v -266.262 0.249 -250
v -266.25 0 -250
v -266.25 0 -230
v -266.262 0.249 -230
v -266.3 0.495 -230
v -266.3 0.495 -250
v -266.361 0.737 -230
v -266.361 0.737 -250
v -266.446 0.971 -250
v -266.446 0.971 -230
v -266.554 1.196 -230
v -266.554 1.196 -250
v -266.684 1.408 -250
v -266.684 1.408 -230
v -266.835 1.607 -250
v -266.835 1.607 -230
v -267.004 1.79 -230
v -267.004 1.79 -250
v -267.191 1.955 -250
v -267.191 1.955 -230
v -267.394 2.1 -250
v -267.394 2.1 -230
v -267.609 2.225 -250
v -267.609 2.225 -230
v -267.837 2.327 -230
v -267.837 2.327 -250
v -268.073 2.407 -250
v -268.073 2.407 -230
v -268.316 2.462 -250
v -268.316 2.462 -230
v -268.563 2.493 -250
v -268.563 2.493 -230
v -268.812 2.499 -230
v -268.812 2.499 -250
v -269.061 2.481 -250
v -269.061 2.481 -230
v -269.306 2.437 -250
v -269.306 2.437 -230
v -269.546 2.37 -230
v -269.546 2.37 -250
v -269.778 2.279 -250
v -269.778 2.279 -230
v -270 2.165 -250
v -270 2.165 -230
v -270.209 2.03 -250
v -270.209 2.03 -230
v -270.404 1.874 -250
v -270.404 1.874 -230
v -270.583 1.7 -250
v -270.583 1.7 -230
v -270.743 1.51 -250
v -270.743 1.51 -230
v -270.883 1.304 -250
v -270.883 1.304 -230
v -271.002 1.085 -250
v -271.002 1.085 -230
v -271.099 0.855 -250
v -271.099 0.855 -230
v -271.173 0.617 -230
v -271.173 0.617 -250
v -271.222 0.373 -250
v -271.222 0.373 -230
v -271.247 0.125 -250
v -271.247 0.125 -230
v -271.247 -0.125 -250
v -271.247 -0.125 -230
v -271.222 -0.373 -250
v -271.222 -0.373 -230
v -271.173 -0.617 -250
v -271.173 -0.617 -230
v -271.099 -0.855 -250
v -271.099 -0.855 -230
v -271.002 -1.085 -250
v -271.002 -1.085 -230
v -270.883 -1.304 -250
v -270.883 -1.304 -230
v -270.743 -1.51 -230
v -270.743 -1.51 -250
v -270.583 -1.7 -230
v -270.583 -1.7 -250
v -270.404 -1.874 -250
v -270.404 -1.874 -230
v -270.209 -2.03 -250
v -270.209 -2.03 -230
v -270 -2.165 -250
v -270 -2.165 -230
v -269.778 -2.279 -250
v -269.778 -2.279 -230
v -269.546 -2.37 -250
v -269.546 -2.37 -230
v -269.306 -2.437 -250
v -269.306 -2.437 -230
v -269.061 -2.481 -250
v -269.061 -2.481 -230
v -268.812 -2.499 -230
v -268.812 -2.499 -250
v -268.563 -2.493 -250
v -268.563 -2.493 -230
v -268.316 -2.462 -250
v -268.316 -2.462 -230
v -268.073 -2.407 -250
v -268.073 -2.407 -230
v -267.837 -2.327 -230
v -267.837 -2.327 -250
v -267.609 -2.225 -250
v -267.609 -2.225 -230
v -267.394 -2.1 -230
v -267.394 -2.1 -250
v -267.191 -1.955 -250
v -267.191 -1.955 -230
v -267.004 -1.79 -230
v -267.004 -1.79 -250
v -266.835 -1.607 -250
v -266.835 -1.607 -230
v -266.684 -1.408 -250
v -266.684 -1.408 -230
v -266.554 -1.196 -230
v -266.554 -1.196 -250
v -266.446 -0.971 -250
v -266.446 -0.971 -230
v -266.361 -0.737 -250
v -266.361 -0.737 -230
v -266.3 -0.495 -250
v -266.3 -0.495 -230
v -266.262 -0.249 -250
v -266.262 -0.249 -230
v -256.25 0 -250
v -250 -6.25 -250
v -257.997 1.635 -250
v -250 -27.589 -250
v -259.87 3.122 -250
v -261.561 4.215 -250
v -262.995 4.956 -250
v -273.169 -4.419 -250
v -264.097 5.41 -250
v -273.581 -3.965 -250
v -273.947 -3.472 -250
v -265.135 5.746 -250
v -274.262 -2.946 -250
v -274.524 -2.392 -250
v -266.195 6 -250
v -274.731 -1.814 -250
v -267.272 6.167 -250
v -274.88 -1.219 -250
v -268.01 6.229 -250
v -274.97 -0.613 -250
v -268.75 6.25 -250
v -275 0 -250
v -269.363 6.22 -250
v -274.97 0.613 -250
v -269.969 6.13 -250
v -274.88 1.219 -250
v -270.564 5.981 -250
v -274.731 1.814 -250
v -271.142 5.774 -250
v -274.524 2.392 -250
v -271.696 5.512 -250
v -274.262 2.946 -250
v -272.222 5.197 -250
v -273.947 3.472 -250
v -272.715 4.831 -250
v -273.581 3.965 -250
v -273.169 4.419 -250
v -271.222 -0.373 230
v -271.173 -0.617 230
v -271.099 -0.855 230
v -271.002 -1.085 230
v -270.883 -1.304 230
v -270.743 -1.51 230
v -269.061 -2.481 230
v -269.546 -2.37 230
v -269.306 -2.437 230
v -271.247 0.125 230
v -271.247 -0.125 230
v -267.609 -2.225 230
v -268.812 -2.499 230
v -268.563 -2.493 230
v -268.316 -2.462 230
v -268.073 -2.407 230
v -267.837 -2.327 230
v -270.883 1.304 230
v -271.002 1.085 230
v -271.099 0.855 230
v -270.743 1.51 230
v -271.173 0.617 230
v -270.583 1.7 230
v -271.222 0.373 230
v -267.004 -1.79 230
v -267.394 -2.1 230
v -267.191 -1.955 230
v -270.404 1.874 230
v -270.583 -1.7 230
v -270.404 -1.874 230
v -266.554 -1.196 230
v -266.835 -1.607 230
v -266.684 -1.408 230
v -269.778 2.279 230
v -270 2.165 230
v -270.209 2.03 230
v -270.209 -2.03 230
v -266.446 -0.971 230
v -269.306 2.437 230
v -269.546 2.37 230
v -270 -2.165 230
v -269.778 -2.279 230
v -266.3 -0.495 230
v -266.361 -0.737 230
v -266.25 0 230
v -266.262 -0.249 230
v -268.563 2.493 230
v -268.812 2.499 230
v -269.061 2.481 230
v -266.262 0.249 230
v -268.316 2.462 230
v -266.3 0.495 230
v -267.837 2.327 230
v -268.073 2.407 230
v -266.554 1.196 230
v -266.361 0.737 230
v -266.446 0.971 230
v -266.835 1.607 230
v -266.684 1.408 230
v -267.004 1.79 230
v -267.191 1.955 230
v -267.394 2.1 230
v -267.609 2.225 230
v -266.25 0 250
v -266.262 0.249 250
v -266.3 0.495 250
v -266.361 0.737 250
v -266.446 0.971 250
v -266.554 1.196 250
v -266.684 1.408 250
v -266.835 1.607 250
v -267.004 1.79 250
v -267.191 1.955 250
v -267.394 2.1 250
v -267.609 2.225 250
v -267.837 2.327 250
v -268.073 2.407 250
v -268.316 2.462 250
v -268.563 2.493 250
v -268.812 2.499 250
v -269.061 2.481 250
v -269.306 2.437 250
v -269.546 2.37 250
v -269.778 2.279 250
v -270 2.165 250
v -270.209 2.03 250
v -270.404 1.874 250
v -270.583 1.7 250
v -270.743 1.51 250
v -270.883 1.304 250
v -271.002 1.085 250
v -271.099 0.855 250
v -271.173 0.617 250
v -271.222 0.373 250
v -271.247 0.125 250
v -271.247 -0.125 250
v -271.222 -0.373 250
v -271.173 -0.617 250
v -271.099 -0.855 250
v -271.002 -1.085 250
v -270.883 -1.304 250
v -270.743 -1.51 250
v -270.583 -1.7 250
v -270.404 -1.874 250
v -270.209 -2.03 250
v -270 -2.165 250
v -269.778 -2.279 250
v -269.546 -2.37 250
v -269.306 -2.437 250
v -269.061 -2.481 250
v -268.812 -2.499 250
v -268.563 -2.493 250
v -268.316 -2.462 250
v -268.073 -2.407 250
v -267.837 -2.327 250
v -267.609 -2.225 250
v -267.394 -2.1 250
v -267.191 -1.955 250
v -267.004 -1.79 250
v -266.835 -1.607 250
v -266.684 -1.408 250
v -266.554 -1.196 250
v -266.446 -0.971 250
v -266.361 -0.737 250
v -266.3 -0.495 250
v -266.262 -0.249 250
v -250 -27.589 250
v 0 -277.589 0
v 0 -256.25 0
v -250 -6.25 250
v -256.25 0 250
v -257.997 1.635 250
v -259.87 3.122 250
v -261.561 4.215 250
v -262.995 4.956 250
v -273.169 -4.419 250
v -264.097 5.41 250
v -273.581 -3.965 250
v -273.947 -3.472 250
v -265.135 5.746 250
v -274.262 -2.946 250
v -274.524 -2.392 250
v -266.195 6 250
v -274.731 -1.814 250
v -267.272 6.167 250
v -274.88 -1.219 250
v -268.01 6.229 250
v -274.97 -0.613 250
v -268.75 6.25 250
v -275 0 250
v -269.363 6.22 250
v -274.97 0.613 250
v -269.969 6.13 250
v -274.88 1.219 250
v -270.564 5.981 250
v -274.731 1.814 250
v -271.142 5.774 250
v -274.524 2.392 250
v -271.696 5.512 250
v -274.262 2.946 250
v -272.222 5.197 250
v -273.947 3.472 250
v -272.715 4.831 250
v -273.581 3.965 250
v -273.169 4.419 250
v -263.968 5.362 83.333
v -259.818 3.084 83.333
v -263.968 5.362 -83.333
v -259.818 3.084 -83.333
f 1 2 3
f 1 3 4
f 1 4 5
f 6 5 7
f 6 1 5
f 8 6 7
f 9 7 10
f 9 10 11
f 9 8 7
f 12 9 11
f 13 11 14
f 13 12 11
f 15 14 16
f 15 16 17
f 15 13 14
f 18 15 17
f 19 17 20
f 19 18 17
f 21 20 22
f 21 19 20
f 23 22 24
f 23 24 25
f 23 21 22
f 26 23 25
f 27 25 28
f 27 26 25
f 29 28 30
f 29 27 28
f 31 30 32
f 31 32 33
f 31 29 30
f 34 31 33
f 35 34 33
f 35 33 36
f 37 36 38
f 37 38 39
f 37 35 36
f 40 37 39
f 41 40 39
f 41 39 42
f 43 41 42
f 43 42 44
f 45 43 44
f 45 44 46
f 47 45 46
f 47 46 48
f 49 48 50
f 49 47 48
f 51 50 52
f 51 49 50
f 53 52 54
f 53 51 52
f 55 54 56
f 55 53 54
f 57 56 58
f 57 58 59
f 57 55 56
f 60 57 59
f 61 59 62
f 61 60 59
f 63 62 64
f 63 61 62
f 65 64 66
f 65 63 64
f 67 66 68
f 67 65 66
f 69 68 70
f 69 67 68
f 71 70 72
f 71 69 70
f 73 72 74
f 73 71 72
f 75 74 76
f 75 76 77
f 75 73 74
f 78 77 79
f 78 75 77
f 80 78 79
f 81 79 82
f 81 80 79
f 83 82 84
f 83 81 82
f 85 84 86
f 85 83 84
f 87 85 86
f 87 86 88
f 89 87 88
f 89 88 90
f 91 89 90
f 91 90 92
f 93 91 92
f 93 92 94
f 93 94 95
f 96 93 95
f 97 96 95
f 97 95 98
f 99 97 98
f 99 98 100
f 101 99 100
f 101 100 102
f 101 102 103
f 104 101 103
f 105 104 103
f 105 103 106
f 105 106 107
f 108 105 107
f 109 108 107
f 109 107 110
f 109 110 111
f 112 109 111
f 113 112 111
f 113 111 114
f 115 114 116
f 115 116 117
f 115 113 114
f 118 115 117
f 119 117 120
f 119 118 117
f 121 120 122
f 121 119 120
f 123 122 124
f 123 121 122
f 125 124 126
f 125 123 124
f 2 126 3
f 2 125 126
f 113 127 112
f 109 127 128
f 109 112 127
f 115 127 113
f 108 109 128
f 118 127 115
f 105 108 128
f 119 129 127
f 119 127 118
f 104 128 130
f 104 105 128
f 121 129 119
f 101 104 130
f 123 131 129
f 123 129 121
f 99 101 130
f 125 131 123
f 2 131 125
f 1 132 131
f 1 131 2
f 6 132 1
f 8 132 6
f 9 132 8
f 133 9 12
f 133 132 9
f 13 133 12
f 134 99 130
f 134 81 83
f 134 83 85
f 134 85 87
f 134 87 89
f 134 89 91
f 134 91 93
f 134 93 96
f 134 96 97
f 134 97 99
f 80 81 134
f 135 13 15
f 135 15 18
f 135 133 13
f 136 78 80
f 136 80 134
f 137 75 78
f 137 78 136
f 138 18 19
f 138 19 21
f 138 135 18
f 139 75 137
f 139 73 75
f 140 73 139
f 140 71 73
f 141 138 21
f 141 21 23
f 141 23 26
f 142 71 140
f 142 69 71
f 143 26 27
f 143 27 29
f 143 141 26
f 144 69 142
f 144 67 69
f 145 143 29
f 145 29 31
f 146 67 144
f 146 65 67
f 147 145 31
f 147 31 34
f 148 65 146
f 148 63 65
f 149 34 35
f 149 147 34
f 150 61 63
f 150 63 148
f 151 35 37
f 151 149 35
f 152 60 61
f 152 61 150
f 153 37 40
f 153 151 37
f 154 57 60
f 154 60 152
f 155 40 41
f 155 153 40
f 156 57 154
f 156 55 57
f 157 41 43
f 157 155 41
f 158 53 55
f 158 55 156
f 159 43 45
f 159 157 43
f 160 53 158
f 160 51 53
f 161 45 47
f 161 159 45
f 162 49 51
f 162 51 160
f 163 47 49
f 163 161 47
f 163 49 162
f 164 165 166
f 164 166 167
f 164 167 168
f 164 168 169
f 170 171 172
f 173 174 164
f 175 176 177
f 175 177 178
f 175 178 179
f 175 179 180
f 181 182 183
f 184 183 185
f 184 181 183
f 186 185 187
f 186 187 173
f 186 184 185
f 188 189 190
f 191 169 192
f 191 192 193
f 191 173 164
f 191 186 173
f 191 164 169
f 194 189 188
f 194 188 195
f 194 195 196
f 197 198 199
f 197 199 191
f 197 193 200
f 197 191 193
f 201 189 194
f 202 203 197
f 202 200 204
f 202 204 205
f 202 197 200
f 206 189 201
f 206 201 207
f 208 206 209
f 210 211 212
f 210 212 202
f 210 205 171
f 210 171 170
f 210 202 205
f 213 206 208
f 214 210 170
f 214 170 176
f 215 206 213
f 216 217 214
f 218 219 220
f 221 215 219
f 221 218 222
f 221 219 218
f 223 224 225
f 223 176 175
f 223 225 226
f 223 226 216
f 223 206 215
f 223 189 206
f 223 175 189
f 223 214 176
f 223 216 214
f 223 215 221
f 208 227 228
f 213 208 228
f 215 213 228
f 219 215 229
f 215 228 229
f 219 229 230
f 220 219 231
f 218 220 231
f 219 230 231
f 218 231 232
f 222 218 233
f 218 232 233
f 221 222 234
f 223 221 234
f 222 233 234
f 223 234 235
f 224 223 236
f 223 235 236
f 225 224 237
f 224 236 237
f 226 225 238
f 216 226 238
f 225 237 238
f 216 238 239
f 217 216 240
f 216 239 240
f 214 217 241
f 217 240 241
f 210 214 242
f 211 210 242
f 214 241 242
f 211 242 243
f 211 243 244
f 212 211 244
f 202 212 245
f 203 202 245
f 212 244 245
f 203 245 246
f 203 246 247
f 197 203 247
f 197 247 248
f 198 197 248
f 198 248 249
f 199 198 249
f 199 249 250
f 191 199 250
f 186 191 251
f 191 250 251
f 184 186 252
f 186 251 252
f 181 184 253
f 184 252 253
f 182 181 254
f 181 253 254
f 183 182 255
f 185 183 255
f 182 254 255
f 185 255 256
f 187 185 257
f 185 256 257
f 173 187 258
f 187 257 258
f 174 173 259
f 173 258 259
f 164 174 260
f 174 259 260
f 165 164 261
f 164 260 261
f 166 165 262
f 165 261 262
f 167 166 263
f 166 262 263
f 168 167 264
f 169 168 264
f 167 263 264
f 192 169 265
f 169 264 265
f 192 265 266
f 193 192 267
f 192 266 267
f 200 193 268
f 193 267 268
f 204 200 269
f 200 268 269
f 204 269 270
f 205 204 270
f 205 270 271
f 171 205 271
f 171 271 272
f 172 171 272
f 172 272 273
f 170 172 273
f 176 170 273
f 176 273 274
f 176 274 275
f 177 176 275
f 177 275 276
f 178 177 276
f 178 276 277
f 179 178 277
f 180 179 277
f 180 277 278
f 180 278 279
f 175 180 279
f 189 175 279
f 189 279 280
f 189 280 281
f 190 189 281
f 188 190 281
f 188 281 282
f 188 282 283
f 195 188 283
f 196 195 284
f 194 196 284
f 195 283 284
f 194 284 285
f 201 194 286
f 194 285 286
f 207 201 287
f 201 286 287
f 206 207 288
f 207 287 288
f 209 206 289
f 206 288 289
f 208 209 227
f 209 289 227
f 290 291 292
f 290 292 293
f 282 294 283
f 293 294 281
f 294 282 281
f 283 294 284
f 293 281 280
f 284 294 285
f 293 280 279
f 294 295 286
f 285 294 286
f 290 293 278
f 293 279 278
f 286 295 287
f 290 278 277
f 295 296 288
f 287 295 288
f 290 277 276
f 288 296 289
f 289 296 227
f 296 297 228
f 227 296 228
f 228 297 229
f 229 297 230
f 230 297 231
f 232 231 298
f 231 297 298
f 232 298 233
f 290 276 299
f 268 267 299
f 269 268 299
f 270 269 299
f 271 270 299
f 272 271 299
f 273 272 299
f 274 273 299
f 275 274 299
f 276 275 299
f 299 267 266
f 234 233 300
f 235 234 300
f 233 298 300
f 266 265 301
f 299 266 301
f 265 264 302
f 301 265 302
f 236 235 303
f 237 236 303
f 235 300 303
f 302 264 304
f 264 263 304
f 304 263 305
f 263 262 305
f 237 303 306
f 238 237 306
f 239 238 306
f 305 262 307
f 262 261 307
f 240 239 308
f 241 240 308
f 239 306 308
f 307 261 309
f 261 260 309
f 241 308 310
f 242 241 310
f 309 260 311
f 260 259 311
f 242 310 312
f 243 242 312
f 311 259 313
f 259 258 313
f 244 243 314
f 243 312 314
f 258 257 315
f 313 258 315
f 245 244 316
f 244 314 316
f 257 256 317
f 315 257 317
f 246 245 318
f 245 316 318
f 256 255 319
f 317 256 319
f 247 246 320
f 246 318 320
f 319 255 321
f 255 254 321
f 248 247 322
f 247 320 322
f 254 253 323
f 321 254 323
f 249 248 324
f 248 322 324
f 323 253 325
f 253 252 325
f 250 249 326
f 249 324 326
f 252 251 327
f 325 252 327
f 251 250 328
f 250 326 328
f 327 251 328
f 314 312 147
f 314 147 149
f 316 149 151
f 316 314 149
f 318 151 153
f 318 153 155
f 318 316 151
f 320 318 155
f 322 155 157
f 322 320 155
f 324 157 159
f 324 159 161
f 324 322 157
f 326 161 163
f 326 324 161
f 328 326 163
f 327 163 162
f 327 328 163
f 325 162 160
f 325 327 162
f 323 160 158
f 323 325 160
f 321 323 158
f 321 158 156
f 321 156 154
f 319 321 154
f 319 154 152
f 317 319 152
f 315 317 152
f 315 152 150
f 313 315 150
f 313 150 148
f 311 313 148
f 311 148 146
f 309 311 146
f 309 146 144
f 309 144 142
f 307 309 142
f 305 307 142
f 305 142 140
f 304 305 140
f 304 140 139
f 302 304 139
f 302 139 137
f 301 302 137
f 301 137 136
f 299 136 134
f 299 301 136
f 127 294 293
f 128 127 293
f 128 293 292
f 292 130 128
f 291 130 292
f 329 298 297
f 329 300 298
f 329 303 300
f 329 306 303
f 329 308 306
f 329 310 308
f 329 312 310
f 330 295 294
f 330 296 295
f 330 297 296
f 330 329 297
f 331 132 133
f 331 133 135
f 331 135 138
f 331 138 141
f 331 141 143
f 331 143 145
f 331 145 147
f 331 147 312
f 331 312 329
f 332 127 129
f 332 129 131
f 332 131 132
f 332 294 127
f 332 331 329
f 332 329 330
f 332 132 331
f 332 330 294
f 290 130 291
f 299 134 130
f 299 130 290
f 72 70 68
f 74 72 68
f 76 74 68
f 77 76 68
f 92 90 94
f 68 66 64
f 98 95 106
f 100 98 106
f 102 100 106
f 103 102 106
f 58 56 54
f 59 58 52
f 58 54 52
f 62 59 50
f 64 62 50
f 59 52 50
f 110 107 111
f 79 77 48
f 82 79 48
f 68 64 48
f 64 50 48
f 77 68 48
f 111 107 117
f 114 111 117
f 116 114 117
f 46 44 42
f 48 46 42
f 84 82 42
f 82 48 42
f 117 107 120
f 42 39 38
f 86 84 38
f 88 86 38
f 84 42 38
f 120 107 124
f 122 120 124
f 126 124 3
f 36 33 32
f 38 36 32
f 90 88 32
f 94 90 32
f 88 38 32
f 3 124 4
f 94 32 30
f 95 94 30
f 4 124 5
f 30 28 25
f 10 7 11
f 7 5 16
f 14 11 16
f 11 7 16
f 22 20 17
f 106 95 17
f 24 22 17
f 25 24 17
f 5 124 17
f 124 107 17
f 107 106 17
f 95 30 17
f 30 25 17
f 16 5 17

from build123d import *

# Parameters (mm, degrees)
SKETCH2_W               = 500
SKETCH2_H               = 12.5
BOSS_EXTRUDE1_DEPTH     = 500
SKETCH6_R               = 6.25
BOSS_EXTRUDE3_DEPTH     = 500
BOSS_EXTRUDE4_DEPTH     = 500
CUT_EXTRUDE2_DEPTH      = 674.624176563
CUT_EXTRUDE2_DEPTH_BACK = 674.624176563
SKETCH9_R               = 2.5
CUT_EXTRUDE3_DEPTH      = 20
INTERSECT3_START        = -357.972808076
INTERSECT3_DEPTH        = 351.722808076


# Read off the part's stored shape, not the designer's step: Intersect3
with BuildPart() as part:
    # Sketch2 → Boss-Extrude1 (new body)
    with BuildSketch(Plane(origin=(-134.375, 134.375, 0), x_dir=(0, 0, 1), z_dir=(0.7071067811865464, -0.7071067811865488, 0))):
        with Locations((0, 190.034947444)):
            Rectangle(SKETCH2_W, SKETCH2_H)
    extrude(amount=BOSS_EXTRUDE1_DEPTH)

    # Sketch6 → Boss-Extrude3 (add)
    with BuildSketch(Plane.XY.offset(250)):
        with Locations((-268.75, 0)):
            Circle(SKETCH6_R)
    extrude(amount=-BOSS_EXTRUDE3_DEPTH)

    # Sketch7 → Boss-Extrude4 (add)
    with BuildSketch(Plane.XY.offset(250)):
        Polygon((-268.75, 6.25), (-262.5, 6.25), (91.053390593, -347.303390593), (89.222807976, -349.133973211), align=None)
    extrude(amount=-BOSS_EXTRUDE4_DEPTH)

    # Sketch8 → Cut-Extrude2 (cut, two sides: drawn at the far end of the back side and taken through both)
    with BuildSketch(Plane.XY.offset(250).offset(-CUT_EXTRUDE2_DEPTH_BACK)):
        with BuildLine():
            Line((-268.75, 6.25), (-263.442130557, 9.619585215))
            Line((-263.442130557, 9.619585215), (-256.25, 0))
            add(Edge.make_bspline(
                [(-268.75, 6.25), (-263.635709853, 6.25), (-259.544039229, 3.294039229), (-256.25, 0)],
                knots=[0, 0, 0, 0, 1, 1, 1, 1], degree=3))
        make_face()
    extrude(amount=CUT_EXTRUDE2_DEPTH + CUT_EXTRUDE2_DEPTH_BACK, mode=Mode.SUBTRACT)

    # Sketch9 → Cut-Extrude3 (cut)
    with BuildSketch(Plane.XY.offset(250)):
        with Locations((-268.75, 0)):
            Circle(SKETCH9_R)
    cut_extrude3 = extrude(amount=-CUT_EXTRUDE3_DEPTH, mode=Mode.SUBTRACT)

    # Mirror2: Cut-Extrude3 across plane
    add(cut_extrude3.mirror(Plane.XY), mode=Mode.SUBTRACT)

    # Intersect3 outline → Intersect3 (cut)
    with BuildSketch(Plane(origin=(0, 0, 0), x_dir=(1, 0, 0), z_dir=(0, 1, 0)).offset(INTERSECT3_START)):
        Polygon((-250, 250), (0, 0), (-250, -250), (93, -250), (93, 250), align=None)
    extrude(amount=INTERSECT3_DEPTH, mode=Mode.SUBTRACT)


solid = part.part
